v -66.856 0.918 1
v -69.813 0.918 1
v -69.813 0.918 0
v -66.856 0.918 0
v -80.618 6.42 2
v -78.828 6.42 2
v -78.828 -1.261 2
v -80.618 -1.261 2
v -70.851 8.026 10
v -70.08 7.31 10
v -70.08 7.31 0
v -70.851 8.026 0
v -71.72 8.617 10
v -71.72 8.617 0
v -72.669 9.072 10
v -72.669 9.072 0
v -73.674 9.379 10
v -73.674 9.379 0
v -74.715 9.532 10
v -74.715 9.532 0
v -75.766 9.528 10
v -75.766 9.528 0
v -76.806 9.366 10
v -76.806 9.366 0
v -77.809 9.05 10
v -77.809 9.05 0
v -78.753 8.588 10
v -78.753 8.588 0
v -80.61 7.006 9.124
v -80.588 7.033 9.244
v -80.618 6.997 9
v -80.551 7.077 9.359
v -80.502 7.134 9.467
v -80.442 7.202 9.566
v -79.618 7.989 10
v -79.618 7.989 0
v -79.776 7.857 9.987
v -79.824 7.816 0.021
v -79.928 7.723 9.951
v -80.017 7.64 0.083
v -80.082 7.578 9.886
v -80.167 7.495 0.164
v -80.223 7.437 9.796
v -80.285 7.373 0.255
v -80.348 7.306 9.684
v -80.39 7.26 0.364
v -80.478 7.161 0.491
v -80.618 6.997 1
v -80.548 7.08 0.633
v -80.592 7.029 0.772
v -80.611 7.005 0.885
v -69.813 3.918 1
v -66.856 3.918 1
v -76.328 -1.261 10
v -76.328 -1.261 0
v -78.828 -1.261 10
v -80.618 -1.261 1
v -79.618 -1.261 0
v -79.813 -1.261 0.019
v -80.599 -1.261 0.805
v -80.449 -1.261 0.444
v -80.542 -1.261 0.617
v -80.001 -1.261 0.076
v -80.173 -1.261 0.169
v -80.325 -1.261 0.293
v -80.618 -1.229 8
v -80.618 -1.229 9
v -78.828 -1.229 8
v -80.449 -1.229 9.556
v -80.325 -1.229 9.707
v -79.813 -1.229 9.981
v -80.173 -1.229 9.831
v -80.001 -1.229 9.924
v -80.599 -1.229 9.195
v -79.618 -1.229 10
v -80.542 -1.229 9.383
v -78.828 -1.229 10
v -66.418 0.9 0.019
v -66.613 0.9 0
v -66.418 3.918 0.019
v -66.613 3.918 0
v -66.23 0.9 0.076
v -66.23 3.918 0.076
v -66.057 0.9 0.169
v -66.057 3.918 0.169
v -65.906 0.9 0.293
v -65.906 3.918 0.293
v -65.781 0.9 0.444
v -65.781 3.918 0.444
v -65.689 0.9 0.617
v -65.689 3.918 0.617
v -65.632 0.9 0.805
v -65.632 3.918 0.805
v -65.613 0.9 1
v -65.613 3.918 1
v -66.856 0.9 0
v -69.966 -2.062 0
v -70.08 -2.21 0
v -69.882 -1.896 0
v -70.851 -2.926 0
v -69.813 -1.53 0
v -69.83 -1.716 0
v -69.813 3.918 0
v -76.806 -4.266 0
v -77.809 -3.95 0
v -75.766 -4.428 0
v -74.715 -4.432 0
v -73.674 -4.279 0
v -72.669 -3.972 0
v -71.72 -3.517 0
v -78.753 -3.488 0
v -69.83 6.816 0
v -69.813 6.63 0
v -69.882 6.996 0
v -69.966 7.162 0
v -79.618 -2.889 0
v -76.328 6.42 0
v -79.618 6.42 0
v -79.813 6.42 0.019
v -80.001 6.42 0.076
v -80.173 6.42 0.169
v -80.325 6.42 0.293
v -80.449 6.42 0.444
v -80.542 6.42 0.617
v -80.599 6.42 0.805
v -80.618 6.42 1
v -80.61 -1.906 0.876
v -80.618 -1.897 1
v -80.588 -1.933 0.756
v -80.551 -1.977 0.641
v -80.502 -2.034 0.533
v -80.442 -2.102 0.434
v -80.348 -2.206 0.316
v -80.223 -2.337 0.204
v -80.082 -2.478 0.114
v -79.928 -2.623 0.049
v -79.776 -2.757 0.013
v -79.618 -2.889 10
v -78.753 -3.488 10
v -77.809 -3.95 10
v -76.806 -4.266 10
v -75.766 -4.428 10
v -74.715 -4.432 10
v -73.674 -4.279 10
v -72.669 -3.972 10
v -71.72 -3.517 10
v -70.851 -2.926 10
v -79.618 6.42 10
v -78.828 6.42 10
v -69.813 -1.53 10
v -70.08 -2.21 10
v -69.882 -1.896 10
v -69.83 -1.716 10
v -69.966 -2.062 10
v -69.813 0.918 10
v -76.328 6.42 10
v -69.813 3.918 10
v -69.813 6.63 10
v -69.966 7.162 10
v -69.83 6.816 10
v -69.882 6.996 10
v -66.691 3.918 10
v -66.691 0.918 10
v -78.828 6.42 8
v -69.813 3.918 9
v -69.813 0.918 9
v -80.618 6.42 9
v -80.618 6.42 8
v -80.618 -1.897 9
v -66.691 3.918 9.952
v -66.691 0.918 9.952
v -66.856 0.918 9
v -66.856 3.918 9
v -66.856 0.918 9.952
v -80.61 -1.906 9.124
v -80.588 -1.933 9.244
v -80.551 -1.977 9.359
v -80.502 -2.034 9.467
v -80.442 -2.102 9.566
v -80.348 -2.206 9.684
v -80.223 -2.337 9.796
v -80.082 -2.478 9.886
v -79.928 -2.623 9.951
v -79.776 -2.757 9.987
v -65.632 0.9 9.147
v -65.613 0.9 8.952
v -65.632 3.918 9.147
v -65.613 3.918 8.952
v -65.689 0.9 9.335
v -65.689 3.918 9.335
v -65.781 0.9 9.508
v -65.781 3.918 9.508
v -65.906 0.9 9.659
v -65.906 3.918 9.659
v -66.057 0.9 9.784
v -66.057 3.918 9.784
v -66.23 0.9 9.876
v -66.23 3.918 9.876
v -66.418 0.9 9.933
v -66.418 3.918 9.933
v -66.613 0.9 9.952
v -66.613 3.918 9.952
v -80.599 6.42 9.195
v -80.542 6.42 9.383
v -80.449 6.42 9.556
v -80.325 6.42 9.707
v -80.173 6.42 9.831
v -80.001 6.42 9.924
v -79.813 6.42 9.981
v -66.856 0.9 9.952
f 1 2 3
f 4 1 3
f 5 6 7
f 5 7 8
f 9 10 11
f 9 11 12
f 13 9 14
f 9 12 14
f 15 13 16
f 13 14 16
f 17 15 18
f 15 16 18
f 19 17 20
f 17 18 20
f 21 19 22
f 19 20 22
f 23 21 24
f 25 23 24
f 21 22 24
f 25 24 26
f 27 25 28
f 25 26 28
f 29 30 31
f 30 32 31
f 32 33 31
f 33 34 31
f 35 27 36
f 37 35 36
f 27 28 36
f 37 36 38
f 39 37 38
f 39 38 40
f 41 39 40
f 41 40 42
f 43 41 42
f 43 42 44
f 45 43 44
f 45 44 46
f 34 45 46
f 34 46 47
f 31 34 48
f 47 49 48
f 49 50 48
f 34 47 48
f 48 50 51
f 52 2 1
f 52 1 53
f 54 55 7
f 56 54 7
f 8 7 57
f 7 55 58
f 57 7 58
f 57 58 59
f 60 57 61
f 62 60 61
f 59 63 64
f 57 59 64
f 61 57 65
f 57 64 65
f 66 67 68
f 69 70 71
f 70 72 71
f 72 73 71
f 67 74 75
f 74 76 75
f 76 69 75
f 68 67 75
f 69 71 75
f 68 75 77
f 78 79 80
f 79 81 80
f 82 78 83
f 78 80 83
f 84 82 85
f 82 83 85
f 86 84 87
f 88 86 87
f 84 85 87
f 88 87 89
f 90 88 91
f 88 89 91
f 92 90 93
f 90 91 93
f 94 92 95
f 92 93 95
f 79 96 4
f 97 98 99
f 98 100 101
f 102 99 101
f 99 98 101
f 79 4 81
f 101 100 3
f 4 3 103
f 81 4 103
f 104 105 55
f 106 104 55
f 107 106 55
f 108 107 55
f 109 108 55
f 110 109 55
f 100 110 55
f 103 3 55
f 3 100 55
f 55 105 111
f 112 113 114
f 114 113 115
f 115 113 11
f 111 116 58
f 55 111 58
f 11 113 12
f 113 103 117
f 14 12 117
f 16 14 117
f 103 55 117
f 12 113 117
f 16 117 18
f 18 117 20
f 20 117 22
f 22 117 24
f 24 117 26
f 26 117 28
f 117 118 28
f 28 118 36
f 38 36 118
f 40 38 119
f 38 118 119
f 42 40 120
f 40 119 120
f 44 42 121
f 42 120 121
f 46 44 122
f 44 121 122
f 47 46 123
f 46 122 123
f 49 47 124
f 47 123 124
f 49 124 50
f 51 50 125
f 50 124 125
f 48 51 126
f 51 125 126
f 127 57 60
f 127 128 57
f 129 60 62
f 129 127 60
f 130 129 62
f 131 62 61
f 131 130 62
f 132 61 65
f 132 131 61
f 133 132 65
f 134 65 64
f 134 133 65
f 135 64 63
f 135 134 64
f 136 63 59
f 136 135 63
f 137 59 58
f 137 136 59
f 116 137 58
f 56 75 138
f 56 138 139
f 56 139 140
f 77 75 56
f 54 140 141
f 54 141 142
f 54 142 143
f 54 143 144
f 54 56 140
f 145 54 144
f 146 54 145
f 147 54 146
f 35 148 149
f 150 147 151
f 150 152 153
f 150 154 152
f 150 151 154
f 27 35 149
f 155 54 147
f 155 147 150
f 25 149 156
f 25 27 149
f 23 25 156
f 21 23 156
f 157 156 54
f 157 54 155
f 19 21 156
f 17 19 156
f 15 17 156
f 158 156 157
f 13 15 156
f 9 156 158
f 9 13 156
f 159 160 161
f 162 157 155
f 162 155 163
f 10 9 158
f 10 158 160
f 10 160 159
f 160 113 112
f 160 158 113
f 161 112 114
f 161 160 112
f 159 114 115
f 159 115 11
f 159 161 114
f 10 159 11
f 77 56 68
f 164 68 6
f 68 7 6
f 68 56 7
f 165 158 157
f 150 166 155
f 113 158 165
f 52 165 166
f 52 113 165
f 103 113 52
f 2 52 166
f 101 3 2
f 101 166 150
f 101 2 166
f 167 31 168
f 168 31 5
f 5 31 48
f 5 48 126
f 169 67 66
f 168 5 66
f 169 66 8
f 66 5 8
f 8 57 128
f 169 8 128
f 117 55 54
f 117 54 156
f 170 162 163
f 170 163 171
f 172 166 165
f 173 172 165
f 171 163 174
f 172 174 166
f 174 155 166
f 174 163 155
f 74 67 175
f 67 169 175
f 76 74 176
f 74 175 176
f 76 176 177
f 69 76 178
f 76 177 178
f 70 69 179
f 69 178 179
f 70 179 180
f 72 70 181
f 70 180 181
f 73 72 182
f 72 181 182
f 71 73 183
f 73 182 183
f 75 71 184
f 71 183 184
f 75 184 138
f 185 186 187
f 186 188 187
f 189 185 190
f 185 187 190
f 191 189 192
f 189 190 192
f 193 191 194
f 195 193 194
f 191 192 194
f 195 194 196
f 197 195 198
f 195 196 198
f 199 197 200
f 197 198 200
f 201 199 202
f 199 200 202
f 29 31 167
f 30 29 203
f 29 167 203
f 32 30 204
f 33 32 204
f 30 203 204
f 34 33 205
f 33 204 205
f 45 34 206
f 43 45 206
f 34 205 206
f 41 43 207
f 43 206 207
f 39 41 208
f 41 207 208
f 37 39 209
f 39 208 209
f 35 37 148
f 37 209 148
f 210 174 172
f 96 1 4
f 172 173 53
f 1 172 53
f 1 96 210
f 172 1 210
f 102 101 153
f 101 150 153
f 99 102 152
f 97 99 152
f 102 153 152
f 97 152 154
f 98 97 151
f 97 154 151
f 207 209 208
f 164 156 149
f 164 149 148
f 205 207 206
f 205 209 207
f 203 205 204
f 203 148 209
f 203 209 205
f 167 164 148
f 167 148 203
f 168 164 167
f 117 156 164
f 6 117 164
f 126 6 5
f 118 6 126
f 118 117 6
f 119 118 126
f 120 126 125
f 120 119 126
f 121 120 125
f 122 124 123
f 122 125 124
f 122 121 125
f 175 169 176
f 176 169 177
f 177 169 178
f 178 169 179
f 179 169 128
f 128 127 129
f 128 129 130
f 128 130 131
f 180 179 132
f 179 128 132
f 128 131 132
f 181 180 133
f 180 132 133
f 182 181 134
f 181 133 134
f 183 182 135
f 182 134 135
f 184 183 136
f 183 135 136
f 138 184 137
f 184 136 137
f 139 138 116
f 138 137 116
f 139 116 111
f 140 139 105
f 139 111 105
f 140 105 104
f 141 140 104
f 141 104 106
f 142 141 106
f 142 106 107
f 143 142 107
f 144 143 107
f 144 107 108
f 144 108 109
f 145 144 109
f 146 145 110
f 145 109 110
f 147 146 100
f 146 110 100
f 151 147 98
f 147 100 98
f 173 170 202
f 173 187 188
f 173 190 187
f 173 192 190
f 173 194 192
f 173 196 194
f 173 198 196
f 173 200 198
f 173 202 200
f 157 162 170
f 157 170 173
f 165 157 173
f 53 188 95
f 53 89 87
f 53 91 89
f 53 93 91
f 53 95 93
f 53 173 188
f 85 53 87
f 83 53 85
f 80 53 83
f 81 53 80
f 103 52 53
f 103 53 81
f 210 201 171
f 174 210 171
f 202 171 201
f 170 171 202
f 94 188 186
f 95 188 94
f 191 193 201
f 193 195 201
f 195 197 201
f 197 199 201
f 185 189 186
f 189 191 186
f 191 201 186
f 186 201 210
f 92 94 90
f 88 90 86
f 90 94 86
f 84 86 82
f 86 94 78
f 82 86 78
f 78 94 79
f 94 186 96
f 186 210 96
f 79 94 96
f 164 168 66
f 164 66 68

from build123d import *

# Parameters (mm, degrees)
SKETCH_1_R            = 7
EXTRUDE_1_DEPTH       = 10
SKETCH_9_W            = 7.120641766
SKETCH_9_H            = 4.534999238
EXTRUDE_6_DEPTH       = 1
SKETCH_11_W           = 1.257653538
SKETCH_11_H           = 9
EXTRUDE_7_DEPTH       = 4.5
EXTRUDE_8_DEPTH       = 6
FILLET_8_R            = 1
FILLET_9_R            = 1
CUT_EXTRUDE_1_DEPTH   = 10
SKETCH_14_W           = 1
SKETCH_14_H           = 3
EXTRUDE_9_DEPTH       = 3.122043073
SKETCH_15_W           = 1
SKETCH_15_H           = 3
EXTRUDE_10_DEPTH      = 4
EXTRUDE_11_DEPTH      = 0.2
EXTRUDE_11_DEPTH_BACK = 1.043632387
SKETCH_16_W           = 9.952294967
SKETCH_16_H           = 3.01746433
FILLET_11_R           = 1
FILLET_12_R           = 1
FILLET_13_R           = 1
FILLET_14_R           = 1
CUT_EXTRUDE_2_DEPTH   = 10
SKETCH_18_W           = 2.5
SKETCH_18_H           = 7.68123899
CUT_EXTRUDE_3_DEPTH   = 10
SKETCH_19_W           = 1.790352256
SKETCH_19_H           = 7.68123899
CUT_EXTRUDE_4_DEPTH   = 2
SKETCH_20_W           = 1.790352256
SKETCH_20_H           = 7.649055087
CUT_EXTRUDE_5_DEPTH   = 2
FILLET_15_R           = 1
FILLET_16_R           = 1
FILLET_17_R           = 1
FILLET_18_R           = 1


with BuildPart() as part:
    # 草圖1 → 填料-伸長1 (new body)
    with BuildSketch(Plane(origin=(0.382706605, 0, 0), x_dir=(1, 0, 0), z_dir=(0, 0, 1))):
        with Locations((-75.594417438, 2.55)):
            Circle(SKETCH_1_R)
    extrude(amount=EXTRUDE_1_DEPTH)

    # 草圖9 → 填料-伸長6 (add)
    with BuildSketch(Plane(origin=(6.127831546, 0, 9), x_dir=(1, 0, 0), z_dir=(0, 0, 1))):
        with Locations((-75.644850643, 2.267499619)):
            Rectangle(SKETCH_9_W, SKETCH_9_H)
    extrude(amount=EXTRUDE_6_DEPTH)



with BuildPart() as body_2:
    # 草圖11 → 填料-伸長7 (new body)
    with BuildSketch(Plane(origin=(9.574526933, 4.534999238, 0.48426017), x_dir=(1, 0, 0), z_dir=(0, 1, 0))):
        with Locations((-76.184774061, -4.5)):
            Rectangle(SKETCH_11_W, SKETCH_11_H)
    extrude(amount=-EXTRUDE_7_DEPTH)


with BuildPart() as part_1:
    add(part.part)

    add(body_2.part)  # 填料-伸長8 merges body 2
    # 草圖12 → 填料-伸長8 (add)
    with BuildSketch(Plane.ZY.offset(67.239073897)):
        Polygon((0.48426017, 4.534999238), (0.48426017, 0), (1.483647509, 0.034999238), (1.483647509, 4.534999238), align=None)
    extrude(amount=EXTRUDE_8_DEPTH)

    # 圓角8
    fillet_8_edges = [part_1.edges().sort_by_distance(p)[0] for p in [
        (-65.981420359, 2.284999238, 0.48426017),
    ]]
    fillet(fillet_8_edges, radius=FILLET_8_R)

    # 圓角9
    fillet_9_edges = [part_1.edges().sort_by_distance(p)[0] for p in [
        (-65.956698214, 2.267499619, 10),
    ]]
    fillet(fillet_9_edges, radius=FILLET_9_R - 0.0001)  # a hair under: the kernel refuses the full size

    # 草圖13 → 除料-伸長1 (cut)
    with BuildSketch(Plane(origin=(0, 0, 0), x_dir=(-1, 0, 0), z_dir=(0, 0, -1))):
        with BuildLine():
            Line((69.812827514, 7.005564937), (69.812827514, -1.905564937))
            ThreePointArc((69.812827514, -1.905564937), (67.081734981, 2.55), (69.812827514, 7.005564937))
        make_face()
    extrude(amount=-CUT_EXTRUDE_1_DEPTH, mode=Mode.SUBTRACT)


with BuildPart() as cut_extrude_1_kept_piece:
    # of the separate pieces the step leaves, the one the design keeps (cut_extrude_1_pieces_kept)
    add(part_1.part.solids().sort_by_distance((-69.812827514, 7.005564937, 10))[0])

    # 草圖14 → 填料-伸長9 (add)
    with BuildSketch(Plane(origin=(-69.812827514, 0, 0), x_dir=(0, 0, -1), z_dir=(1, 0, 0))):
        with Locations((-9.5, 2.417510407)):
            Rectangle(SKETCH_14_W, SKETCH_14_H)
    extrude(amount=EXTRUDE_9_DEPTH)

    # 草圖15 → 填料-伸長10 (add)
    with BuildSketch(Plane(origin=(-69.812827514, 0, 0), x_dir=(0, 0, -1), z_dir=(1, 0, 0))):
        with Locations((-0.5, 2.417510407)):
            Rectangle(SKETCH_15_W, SKETCH_15_H)
    extrude(amount=EXTRUDE_10_DEPTH)

    # 草圖16 → 填料-伸長11 (add, two sides: drawn at the far end of the back side and taken through both)
    with BuildSketch(Plane(origin=(-65.812827514, 0, 0), x_dir=(0, 0, -1), z_dir=(1, 0, 0)).offset(-EXTRUDE_11_DEPTH_BACK)):
        with Locations((-4.976147484, 2.408778242)):
            Rectangle(SKETCH_16_W, SKETCH_16_H)
    extrude(amount=EXTRUDE_11_DEPTH + EXTRUDE_11_DEPTH_BACK)

    # 圓角11
    fillet_11_edges = [cut_extrude_1_kept_piece.edges().sort_by_distance(p)[0] for p in [
        (-65.612827514, 2.408778242, 0),
    ]]
    fillet(fillet_11_edges, radius=FILLET_11_R)

    # 圓角12
    fillet_12_edges = [cut_extrude_1_kept_piece.edges().sort_by_distance(p)[0] for p in [
        (-65.612827514, 2.408778242, 9.952294967),
    ]]
    fillet(fillet_12_edges, radius=FILLET_12_R)

    # 圓角13
    fillet_13_edges = [cut_extrude_1_kept_piece.edges().sort_by_distance(p)[0] for p in [
        (-69.812827514, 7.005564937, 5),
    ]]
    fillet(fillet_13_edges, radius=FILLET_13_R)

    # 圓角14
    fillet_14_edges = [cut_extrude_1_kept_piece.edges().sort_by_distance(p)[0] for p in [
        (-69.812827514, -1.905564937, 5),
    ]]
    fillet(fillet_14_edges, radius=FILLET_14_R)

    # 草圖17 → 除料-伸長2 (cut)
    with BuildSketch(Plane(origin=(0, 0, 0), x_dir=(-1, 0, 0), z_dir=(0, 0, -1))):
        with BuildLine():
            Line((80.617907093, 6.99668888), (80.617907093, -1.89668888))
            ThreePointArc((80.617907093, -1.89668888), (82.589637241, 2.55), (80.617907093, 6.99668888))
        make_face()
    extrude(amount=-CUT_EXTRUDE_2_DEPTH, mode=Mode.SUBTRACT)

    # 草圖18 → 除料-伸長3 (cut)
    with BuildSketch(Plane(origin=(0, 0, 0), x_dir=(-1, 0, 0), z_dir=(0, 0, -1))):
        with Locations((77.577554837, 2.579171883)):
            Rectangle(SKETCH_18_W, SKETCH_18_H)
    extrude(amount=-CUT_EXTRUDE_3_DEPTH, mode=Mode.SUBTRACT)

    # 草圖19 → 除料-伸長4 (cut)
    with BuildSketch(Plane(origin=(0, 0, 0), x_dir=(-1, 0, 0), z_dir=(0, 0, -1))):
        with Locations((79.722730965, 2.579171883)):
            Rectangle(SKETCH_19_W, SKETCH_19_H)
    extrude(amount=-CUT_EXTRUDE_4_DEPTH, mode=Mode.SUBTRACT)

    # 草圖20 → 除料-伸長5 (cut)
    with BuildSketch(Plane.XY.offset(10)):
        with Locations((-79.722730965, 2.595263834)):
            Rectangle(SKETCH_20_W, SKETCH_20_H)
    extrude(amount=-CUT_EXTRUDE_5_DEPTH, mode=Mode.SUBTRACT)

    # 圓角15
    fillet_15_edges = [cut_extrude_1_kept_piece.edges().sort_by_distance(p)[0] for p in [
        (-80.617907093, 6.708240129, 0),
    ]]
    fillet(fillet_15_edges, radius=FILLET_15_R)

    # 圓角16
    fillet_16_edges = [cut_extrude_1_kept_piece.edges().sort_by_distance(p)[0] for p in [
        (-80.617907093, 6.708240129, 10),
    ]]
    fillet(fillet_16_edges, radius=FILLET_16_R)

    # 圓角17
    fillet_17_edges = [cut_extrude_1_kept_piece.edges().sort_by_distance(p)[0] for p in [
        (-80.617907093, -1.579068246, 0),
    ]]
    fillet(fillet_17_edges, radius=FILLET_17_R)

    # 圓角18
    fillet_18_edges = [cut_extrude_1_kept_piece.edges().sort_by_distance(p)[0] for p in [
        (-80.617907093, -1.562976295, 10),
    ]]
    fillet(fillet_18_edges, radius=FILLET_18_R)


solid = cut_extrude_1_kept_piece.part
